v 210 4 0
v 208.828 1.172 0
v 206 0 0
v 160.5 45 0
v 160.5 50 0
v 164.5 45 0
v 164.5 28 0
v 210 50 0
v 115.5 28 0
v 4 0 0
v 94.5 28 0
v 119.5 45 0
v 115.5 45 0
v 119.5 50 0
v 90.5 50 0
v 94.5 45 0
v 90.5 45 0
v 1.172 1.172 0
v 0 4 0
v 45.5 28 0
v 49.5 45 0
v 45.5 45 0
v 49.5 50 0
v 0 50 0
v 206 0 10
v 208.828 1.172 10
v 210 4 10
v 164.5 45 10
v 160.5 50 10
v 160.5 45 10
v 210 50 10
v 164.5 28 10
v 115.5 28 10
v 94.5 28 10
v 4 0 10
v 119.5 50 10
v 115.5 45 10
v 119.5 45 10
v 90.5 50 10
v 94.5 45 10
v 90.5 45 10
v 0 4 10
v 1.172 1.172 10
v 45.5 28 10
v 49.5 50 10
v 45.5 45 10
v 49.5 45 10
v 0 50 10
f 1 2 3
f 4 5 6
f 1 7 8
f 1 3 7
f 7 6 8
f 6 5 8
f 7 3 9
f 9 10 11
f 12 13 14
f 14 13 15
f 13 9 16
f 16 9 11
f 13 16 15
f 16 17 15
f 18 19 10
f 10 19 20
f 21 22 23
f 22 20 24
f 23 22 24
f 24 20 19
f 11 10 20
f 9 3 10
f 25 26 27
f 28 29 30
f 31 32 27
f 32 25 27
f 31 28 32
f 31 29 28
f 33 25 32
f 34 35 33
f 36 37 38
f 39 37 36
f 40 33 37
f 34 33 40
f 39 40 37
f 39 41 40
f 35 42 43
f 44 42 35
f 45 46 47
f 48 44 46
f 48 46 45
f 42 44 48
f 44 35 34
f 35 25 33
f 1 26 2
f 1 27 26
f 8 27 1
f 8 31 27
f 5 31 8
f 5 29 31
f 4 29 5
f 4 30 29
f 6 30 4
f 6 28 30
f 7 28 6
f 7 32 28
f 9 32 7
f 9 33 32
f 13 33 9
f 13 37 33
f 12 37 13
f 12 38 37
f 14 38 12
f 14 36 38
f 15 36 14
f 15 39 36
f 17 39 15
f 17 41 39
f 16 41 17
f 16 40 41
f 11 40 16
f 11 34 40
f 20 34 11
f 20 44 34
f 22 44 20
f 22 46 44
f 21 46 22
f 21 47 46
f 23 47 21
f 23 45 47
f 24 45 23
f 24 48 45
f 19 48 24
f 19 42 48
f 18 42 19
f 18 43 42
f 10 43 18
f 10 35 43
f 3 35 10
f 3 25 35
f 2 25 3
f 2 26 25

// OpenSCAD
$fn = 32;

// ----------------------------------------------------------------------
// Oversize slot bar: 210 mm bar with 2 oversize windows
// ----------------------------------------------------------------------

// --- parameters (mm) ---
profile_height = 10;      // extrusion height
profile_points = 24;      // points of the closed outline

profile = [[0, 4], [1.172, 1.172], [4, 0], [206, 0], [208.828, 1.172], [210, 4], [210, 50], [160.5, 50], [160.5, 45], [164.5, 45], [164.5, 28], [115.5, 28], [115.5, 45], [119.5, 45], [119.5, 50], [90.5, 50], [90.5, 45], [94.5, 45], [94.5, 28], [45.5, 28], [45.5, 45], [49.5, 45], [49.5, 50], [0, 50]];  // single closed polygon, 24 points, counter clockwise

// --- the one profile operation ---
linear_extrude(height = profile_height) polygon(points = profile);
